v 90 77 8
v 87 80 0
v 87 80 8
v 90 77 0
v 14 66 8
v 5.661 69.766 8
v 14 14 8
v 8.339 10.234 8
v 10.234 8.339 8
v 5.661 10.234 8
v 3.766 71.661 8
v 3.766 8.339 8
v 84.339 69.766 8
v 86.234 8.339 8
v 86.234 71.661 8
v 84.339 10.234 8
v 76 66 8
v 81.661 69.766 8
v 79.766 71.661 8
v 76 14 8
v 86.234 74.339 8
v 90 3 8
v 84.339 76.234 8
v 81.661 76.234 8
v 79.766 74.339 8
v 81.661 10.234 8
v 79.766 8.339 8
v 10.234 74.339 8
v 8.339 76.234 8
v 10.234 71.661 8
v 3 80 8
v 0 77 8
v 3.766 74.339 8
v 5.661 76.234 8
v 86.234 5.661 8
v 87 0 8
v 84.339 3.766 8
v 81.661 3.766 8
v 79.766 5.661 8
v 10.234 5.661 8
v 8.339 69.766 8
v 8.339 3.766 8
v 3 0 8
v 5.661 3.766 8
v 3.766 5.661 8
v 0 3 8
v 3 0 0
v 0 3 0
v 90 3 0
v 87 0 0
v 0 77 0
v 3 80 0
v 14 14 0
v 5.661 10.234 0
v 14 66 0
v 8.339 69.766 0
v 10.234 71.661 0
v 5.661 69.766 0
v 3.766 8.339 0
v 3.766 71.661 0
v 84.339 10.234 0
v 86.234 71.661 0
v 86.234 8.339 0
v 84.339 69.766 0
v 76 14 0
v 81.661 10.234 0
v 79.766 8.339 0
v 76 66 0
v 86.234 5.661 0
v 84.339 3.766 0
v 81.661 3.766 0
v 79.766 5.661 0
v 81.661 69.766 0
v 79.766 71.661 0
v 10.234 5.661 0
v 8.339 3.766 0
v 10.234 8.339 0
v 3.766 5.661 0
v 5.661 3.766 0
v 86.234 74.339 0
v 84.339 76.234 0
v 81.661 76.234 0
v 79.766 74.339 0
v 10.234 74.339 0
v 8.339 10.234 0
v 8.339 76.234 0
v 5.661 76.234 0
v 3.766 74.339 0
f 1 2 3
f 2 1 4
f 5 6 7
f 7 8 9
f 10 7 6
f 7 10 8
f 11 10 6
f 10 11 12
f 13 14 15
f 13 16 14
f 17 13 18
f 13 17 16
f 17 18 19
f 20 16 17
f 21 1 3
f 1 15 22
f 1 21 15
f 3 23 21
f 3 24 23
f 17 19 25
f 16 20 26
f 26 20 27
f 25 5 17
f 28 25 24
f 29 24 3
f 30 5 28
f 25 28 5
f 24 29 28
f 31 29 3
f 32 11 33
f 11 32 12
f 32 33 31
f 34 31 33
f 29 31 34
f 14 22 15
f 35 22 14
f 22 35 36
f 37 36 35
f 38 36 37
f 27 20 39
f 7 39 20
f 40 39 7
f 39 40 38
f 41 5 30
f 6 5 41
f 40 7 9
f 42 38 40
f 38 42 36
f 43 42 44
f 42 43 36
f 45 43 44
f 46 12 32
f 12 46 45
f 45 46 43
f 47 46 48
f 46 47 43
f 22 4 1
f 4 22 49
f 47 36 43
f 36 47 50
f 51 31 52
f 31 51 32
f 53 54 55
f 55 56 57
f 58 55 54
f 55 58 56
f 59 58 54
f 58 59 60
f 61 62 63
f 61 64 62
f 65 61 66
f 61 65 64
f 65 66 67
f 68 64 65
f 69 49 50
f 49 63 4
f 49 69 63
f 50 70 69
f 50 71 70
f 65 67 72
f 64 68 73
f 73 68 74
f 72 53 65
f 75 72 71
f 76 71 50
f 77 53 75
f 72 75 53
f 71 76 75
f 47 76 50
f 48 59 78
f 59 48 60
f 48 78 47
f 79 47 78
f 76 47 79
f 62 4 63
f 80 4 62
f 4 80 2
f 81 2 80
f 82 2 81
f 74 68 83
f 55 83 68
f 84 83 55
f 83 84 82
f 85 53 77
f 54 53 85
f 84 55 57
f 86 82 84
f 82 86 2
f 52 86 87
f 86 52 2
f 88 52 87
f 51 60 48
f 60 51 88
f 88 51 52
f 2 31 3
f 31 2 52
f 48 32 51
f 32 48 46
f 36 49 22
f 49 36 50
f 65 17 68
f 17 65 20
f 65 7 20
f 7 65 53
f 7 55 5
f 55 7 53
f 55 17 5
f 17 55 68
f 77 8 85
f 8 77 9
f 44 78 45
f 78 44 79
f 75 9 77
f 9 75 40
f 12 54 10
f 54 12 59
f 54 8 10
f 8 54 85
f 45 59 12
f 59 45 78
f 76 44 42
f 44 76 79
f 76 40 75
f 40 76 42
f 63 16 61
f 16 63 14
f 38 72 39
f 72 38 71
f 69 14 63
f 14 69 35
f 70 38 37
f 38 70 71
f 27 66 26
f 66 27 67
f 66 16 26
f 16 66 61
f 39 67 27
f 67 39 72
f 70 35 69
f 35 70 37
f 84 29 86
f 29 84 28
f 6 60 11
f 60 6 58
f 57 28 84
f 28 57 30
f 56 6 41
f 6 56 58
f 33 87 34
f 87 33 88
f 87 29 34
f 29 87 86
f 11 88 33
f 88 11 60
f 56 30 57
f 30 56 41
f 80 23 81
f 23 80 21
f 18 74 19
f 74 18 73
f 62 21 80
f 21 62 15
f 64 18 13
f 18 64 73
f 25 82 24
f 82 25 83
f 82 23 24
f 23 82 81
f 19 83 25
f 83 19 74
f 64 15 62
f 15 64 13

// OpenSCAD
$fn = 32;

// ----------------------------------------------------------------------
// Frame plate: 90 x 80 frame, 14 mm rails
// ----------------------------------------------------------------------

// --- parameters (mm) ---
plate_l = 90;             // plate length, X
plate_w = 80;             // plate width, Y
plate_t = 8;              // plate thickness, Z (extrusion height)
corner_c = 3;             // corner chamfer
frame_bar = 14;           // frame rail width
bolt_r = 3.5;             // corner bolt window radius
bolt_inset = 7;           // bolt centre inset from the edges
fit_tol = 0.02;           // declared fit tolerance (prompt contract)
free_tol = 0.2;           // declared free tolerance (prompt contract)

win_l = plate_l - 2 * frame_bar;  // window length
win_w = plate_w - 2 * frame_bar;  // window width
bolt_d = 2 * bolt_r;  // corner hole diameter

profile = [[3, 0], [87, 0], [90, 3], [90, 77], [87, 80], [3, 80], [0, 77], [0, 3]];  // primary outline, 8 points, counter clockwise
void_1 = [[14, 14], [76, 14], [76, 66], [14, 66]];  // the window, 4 points
void_2 = [[10.234, 8.339], [8.339, 10.234], [5.661, 10.234], [3.766, 8.339], [3.766, 5.661], [5.661, 3.766], [8.339, 3.766], [10.234, 5.661]];  // corner bolt window, 8 points
void_3 = [[86.234, 8.339], [84.339, 10.234], [81.661, 10.234], [79.766, 8.339], [79.766, 5.661], [81.661, 3.766], [84.339, 3.766], [86.234, 5.661]];  // corner bolt window, 8 points
void_4 = [[10.234, 74.339], [8.339, 76.234], [5.661, 76.234], [3.766, 74.339], [3.766, 71.661], [5.661, 69.766], [8.339, 69.766], [10.234, 71.661]];  // corner bolt window, 8 points
void_5 = [[86.234, 74.339], [84.339, 76.234], [81.661, 76.234], [79.766, 74.339], [79.766, 71.661], [81.661, 69.766], [84.339, 69.766], [86.234, 71.661]];  // corner bolt window, 8 points

// --- the one profile operation ---
difference() {
  linear_extrude(height = plate_t) polygon(points = profile);
  translate([0, 0, -1])
    linear_extrude(height = plate_t + 2) polygon(points = void_1);
  translate([0, 0, -1])
    linear_extrude(height = plate_t + 2) polygon(points = void_2);
  translate([0, 0, -1])
    linear_extrude(height = plate_t + 2) polygon(points = void_3);
  translate([0, 0, -1])
    linear_extrude(height = plate_t + 2) polygon(points = void_4);
  translate([0, 0, -1])
    linear_extrude(height = plate_t + 2) polygon(points = void_5);
}
